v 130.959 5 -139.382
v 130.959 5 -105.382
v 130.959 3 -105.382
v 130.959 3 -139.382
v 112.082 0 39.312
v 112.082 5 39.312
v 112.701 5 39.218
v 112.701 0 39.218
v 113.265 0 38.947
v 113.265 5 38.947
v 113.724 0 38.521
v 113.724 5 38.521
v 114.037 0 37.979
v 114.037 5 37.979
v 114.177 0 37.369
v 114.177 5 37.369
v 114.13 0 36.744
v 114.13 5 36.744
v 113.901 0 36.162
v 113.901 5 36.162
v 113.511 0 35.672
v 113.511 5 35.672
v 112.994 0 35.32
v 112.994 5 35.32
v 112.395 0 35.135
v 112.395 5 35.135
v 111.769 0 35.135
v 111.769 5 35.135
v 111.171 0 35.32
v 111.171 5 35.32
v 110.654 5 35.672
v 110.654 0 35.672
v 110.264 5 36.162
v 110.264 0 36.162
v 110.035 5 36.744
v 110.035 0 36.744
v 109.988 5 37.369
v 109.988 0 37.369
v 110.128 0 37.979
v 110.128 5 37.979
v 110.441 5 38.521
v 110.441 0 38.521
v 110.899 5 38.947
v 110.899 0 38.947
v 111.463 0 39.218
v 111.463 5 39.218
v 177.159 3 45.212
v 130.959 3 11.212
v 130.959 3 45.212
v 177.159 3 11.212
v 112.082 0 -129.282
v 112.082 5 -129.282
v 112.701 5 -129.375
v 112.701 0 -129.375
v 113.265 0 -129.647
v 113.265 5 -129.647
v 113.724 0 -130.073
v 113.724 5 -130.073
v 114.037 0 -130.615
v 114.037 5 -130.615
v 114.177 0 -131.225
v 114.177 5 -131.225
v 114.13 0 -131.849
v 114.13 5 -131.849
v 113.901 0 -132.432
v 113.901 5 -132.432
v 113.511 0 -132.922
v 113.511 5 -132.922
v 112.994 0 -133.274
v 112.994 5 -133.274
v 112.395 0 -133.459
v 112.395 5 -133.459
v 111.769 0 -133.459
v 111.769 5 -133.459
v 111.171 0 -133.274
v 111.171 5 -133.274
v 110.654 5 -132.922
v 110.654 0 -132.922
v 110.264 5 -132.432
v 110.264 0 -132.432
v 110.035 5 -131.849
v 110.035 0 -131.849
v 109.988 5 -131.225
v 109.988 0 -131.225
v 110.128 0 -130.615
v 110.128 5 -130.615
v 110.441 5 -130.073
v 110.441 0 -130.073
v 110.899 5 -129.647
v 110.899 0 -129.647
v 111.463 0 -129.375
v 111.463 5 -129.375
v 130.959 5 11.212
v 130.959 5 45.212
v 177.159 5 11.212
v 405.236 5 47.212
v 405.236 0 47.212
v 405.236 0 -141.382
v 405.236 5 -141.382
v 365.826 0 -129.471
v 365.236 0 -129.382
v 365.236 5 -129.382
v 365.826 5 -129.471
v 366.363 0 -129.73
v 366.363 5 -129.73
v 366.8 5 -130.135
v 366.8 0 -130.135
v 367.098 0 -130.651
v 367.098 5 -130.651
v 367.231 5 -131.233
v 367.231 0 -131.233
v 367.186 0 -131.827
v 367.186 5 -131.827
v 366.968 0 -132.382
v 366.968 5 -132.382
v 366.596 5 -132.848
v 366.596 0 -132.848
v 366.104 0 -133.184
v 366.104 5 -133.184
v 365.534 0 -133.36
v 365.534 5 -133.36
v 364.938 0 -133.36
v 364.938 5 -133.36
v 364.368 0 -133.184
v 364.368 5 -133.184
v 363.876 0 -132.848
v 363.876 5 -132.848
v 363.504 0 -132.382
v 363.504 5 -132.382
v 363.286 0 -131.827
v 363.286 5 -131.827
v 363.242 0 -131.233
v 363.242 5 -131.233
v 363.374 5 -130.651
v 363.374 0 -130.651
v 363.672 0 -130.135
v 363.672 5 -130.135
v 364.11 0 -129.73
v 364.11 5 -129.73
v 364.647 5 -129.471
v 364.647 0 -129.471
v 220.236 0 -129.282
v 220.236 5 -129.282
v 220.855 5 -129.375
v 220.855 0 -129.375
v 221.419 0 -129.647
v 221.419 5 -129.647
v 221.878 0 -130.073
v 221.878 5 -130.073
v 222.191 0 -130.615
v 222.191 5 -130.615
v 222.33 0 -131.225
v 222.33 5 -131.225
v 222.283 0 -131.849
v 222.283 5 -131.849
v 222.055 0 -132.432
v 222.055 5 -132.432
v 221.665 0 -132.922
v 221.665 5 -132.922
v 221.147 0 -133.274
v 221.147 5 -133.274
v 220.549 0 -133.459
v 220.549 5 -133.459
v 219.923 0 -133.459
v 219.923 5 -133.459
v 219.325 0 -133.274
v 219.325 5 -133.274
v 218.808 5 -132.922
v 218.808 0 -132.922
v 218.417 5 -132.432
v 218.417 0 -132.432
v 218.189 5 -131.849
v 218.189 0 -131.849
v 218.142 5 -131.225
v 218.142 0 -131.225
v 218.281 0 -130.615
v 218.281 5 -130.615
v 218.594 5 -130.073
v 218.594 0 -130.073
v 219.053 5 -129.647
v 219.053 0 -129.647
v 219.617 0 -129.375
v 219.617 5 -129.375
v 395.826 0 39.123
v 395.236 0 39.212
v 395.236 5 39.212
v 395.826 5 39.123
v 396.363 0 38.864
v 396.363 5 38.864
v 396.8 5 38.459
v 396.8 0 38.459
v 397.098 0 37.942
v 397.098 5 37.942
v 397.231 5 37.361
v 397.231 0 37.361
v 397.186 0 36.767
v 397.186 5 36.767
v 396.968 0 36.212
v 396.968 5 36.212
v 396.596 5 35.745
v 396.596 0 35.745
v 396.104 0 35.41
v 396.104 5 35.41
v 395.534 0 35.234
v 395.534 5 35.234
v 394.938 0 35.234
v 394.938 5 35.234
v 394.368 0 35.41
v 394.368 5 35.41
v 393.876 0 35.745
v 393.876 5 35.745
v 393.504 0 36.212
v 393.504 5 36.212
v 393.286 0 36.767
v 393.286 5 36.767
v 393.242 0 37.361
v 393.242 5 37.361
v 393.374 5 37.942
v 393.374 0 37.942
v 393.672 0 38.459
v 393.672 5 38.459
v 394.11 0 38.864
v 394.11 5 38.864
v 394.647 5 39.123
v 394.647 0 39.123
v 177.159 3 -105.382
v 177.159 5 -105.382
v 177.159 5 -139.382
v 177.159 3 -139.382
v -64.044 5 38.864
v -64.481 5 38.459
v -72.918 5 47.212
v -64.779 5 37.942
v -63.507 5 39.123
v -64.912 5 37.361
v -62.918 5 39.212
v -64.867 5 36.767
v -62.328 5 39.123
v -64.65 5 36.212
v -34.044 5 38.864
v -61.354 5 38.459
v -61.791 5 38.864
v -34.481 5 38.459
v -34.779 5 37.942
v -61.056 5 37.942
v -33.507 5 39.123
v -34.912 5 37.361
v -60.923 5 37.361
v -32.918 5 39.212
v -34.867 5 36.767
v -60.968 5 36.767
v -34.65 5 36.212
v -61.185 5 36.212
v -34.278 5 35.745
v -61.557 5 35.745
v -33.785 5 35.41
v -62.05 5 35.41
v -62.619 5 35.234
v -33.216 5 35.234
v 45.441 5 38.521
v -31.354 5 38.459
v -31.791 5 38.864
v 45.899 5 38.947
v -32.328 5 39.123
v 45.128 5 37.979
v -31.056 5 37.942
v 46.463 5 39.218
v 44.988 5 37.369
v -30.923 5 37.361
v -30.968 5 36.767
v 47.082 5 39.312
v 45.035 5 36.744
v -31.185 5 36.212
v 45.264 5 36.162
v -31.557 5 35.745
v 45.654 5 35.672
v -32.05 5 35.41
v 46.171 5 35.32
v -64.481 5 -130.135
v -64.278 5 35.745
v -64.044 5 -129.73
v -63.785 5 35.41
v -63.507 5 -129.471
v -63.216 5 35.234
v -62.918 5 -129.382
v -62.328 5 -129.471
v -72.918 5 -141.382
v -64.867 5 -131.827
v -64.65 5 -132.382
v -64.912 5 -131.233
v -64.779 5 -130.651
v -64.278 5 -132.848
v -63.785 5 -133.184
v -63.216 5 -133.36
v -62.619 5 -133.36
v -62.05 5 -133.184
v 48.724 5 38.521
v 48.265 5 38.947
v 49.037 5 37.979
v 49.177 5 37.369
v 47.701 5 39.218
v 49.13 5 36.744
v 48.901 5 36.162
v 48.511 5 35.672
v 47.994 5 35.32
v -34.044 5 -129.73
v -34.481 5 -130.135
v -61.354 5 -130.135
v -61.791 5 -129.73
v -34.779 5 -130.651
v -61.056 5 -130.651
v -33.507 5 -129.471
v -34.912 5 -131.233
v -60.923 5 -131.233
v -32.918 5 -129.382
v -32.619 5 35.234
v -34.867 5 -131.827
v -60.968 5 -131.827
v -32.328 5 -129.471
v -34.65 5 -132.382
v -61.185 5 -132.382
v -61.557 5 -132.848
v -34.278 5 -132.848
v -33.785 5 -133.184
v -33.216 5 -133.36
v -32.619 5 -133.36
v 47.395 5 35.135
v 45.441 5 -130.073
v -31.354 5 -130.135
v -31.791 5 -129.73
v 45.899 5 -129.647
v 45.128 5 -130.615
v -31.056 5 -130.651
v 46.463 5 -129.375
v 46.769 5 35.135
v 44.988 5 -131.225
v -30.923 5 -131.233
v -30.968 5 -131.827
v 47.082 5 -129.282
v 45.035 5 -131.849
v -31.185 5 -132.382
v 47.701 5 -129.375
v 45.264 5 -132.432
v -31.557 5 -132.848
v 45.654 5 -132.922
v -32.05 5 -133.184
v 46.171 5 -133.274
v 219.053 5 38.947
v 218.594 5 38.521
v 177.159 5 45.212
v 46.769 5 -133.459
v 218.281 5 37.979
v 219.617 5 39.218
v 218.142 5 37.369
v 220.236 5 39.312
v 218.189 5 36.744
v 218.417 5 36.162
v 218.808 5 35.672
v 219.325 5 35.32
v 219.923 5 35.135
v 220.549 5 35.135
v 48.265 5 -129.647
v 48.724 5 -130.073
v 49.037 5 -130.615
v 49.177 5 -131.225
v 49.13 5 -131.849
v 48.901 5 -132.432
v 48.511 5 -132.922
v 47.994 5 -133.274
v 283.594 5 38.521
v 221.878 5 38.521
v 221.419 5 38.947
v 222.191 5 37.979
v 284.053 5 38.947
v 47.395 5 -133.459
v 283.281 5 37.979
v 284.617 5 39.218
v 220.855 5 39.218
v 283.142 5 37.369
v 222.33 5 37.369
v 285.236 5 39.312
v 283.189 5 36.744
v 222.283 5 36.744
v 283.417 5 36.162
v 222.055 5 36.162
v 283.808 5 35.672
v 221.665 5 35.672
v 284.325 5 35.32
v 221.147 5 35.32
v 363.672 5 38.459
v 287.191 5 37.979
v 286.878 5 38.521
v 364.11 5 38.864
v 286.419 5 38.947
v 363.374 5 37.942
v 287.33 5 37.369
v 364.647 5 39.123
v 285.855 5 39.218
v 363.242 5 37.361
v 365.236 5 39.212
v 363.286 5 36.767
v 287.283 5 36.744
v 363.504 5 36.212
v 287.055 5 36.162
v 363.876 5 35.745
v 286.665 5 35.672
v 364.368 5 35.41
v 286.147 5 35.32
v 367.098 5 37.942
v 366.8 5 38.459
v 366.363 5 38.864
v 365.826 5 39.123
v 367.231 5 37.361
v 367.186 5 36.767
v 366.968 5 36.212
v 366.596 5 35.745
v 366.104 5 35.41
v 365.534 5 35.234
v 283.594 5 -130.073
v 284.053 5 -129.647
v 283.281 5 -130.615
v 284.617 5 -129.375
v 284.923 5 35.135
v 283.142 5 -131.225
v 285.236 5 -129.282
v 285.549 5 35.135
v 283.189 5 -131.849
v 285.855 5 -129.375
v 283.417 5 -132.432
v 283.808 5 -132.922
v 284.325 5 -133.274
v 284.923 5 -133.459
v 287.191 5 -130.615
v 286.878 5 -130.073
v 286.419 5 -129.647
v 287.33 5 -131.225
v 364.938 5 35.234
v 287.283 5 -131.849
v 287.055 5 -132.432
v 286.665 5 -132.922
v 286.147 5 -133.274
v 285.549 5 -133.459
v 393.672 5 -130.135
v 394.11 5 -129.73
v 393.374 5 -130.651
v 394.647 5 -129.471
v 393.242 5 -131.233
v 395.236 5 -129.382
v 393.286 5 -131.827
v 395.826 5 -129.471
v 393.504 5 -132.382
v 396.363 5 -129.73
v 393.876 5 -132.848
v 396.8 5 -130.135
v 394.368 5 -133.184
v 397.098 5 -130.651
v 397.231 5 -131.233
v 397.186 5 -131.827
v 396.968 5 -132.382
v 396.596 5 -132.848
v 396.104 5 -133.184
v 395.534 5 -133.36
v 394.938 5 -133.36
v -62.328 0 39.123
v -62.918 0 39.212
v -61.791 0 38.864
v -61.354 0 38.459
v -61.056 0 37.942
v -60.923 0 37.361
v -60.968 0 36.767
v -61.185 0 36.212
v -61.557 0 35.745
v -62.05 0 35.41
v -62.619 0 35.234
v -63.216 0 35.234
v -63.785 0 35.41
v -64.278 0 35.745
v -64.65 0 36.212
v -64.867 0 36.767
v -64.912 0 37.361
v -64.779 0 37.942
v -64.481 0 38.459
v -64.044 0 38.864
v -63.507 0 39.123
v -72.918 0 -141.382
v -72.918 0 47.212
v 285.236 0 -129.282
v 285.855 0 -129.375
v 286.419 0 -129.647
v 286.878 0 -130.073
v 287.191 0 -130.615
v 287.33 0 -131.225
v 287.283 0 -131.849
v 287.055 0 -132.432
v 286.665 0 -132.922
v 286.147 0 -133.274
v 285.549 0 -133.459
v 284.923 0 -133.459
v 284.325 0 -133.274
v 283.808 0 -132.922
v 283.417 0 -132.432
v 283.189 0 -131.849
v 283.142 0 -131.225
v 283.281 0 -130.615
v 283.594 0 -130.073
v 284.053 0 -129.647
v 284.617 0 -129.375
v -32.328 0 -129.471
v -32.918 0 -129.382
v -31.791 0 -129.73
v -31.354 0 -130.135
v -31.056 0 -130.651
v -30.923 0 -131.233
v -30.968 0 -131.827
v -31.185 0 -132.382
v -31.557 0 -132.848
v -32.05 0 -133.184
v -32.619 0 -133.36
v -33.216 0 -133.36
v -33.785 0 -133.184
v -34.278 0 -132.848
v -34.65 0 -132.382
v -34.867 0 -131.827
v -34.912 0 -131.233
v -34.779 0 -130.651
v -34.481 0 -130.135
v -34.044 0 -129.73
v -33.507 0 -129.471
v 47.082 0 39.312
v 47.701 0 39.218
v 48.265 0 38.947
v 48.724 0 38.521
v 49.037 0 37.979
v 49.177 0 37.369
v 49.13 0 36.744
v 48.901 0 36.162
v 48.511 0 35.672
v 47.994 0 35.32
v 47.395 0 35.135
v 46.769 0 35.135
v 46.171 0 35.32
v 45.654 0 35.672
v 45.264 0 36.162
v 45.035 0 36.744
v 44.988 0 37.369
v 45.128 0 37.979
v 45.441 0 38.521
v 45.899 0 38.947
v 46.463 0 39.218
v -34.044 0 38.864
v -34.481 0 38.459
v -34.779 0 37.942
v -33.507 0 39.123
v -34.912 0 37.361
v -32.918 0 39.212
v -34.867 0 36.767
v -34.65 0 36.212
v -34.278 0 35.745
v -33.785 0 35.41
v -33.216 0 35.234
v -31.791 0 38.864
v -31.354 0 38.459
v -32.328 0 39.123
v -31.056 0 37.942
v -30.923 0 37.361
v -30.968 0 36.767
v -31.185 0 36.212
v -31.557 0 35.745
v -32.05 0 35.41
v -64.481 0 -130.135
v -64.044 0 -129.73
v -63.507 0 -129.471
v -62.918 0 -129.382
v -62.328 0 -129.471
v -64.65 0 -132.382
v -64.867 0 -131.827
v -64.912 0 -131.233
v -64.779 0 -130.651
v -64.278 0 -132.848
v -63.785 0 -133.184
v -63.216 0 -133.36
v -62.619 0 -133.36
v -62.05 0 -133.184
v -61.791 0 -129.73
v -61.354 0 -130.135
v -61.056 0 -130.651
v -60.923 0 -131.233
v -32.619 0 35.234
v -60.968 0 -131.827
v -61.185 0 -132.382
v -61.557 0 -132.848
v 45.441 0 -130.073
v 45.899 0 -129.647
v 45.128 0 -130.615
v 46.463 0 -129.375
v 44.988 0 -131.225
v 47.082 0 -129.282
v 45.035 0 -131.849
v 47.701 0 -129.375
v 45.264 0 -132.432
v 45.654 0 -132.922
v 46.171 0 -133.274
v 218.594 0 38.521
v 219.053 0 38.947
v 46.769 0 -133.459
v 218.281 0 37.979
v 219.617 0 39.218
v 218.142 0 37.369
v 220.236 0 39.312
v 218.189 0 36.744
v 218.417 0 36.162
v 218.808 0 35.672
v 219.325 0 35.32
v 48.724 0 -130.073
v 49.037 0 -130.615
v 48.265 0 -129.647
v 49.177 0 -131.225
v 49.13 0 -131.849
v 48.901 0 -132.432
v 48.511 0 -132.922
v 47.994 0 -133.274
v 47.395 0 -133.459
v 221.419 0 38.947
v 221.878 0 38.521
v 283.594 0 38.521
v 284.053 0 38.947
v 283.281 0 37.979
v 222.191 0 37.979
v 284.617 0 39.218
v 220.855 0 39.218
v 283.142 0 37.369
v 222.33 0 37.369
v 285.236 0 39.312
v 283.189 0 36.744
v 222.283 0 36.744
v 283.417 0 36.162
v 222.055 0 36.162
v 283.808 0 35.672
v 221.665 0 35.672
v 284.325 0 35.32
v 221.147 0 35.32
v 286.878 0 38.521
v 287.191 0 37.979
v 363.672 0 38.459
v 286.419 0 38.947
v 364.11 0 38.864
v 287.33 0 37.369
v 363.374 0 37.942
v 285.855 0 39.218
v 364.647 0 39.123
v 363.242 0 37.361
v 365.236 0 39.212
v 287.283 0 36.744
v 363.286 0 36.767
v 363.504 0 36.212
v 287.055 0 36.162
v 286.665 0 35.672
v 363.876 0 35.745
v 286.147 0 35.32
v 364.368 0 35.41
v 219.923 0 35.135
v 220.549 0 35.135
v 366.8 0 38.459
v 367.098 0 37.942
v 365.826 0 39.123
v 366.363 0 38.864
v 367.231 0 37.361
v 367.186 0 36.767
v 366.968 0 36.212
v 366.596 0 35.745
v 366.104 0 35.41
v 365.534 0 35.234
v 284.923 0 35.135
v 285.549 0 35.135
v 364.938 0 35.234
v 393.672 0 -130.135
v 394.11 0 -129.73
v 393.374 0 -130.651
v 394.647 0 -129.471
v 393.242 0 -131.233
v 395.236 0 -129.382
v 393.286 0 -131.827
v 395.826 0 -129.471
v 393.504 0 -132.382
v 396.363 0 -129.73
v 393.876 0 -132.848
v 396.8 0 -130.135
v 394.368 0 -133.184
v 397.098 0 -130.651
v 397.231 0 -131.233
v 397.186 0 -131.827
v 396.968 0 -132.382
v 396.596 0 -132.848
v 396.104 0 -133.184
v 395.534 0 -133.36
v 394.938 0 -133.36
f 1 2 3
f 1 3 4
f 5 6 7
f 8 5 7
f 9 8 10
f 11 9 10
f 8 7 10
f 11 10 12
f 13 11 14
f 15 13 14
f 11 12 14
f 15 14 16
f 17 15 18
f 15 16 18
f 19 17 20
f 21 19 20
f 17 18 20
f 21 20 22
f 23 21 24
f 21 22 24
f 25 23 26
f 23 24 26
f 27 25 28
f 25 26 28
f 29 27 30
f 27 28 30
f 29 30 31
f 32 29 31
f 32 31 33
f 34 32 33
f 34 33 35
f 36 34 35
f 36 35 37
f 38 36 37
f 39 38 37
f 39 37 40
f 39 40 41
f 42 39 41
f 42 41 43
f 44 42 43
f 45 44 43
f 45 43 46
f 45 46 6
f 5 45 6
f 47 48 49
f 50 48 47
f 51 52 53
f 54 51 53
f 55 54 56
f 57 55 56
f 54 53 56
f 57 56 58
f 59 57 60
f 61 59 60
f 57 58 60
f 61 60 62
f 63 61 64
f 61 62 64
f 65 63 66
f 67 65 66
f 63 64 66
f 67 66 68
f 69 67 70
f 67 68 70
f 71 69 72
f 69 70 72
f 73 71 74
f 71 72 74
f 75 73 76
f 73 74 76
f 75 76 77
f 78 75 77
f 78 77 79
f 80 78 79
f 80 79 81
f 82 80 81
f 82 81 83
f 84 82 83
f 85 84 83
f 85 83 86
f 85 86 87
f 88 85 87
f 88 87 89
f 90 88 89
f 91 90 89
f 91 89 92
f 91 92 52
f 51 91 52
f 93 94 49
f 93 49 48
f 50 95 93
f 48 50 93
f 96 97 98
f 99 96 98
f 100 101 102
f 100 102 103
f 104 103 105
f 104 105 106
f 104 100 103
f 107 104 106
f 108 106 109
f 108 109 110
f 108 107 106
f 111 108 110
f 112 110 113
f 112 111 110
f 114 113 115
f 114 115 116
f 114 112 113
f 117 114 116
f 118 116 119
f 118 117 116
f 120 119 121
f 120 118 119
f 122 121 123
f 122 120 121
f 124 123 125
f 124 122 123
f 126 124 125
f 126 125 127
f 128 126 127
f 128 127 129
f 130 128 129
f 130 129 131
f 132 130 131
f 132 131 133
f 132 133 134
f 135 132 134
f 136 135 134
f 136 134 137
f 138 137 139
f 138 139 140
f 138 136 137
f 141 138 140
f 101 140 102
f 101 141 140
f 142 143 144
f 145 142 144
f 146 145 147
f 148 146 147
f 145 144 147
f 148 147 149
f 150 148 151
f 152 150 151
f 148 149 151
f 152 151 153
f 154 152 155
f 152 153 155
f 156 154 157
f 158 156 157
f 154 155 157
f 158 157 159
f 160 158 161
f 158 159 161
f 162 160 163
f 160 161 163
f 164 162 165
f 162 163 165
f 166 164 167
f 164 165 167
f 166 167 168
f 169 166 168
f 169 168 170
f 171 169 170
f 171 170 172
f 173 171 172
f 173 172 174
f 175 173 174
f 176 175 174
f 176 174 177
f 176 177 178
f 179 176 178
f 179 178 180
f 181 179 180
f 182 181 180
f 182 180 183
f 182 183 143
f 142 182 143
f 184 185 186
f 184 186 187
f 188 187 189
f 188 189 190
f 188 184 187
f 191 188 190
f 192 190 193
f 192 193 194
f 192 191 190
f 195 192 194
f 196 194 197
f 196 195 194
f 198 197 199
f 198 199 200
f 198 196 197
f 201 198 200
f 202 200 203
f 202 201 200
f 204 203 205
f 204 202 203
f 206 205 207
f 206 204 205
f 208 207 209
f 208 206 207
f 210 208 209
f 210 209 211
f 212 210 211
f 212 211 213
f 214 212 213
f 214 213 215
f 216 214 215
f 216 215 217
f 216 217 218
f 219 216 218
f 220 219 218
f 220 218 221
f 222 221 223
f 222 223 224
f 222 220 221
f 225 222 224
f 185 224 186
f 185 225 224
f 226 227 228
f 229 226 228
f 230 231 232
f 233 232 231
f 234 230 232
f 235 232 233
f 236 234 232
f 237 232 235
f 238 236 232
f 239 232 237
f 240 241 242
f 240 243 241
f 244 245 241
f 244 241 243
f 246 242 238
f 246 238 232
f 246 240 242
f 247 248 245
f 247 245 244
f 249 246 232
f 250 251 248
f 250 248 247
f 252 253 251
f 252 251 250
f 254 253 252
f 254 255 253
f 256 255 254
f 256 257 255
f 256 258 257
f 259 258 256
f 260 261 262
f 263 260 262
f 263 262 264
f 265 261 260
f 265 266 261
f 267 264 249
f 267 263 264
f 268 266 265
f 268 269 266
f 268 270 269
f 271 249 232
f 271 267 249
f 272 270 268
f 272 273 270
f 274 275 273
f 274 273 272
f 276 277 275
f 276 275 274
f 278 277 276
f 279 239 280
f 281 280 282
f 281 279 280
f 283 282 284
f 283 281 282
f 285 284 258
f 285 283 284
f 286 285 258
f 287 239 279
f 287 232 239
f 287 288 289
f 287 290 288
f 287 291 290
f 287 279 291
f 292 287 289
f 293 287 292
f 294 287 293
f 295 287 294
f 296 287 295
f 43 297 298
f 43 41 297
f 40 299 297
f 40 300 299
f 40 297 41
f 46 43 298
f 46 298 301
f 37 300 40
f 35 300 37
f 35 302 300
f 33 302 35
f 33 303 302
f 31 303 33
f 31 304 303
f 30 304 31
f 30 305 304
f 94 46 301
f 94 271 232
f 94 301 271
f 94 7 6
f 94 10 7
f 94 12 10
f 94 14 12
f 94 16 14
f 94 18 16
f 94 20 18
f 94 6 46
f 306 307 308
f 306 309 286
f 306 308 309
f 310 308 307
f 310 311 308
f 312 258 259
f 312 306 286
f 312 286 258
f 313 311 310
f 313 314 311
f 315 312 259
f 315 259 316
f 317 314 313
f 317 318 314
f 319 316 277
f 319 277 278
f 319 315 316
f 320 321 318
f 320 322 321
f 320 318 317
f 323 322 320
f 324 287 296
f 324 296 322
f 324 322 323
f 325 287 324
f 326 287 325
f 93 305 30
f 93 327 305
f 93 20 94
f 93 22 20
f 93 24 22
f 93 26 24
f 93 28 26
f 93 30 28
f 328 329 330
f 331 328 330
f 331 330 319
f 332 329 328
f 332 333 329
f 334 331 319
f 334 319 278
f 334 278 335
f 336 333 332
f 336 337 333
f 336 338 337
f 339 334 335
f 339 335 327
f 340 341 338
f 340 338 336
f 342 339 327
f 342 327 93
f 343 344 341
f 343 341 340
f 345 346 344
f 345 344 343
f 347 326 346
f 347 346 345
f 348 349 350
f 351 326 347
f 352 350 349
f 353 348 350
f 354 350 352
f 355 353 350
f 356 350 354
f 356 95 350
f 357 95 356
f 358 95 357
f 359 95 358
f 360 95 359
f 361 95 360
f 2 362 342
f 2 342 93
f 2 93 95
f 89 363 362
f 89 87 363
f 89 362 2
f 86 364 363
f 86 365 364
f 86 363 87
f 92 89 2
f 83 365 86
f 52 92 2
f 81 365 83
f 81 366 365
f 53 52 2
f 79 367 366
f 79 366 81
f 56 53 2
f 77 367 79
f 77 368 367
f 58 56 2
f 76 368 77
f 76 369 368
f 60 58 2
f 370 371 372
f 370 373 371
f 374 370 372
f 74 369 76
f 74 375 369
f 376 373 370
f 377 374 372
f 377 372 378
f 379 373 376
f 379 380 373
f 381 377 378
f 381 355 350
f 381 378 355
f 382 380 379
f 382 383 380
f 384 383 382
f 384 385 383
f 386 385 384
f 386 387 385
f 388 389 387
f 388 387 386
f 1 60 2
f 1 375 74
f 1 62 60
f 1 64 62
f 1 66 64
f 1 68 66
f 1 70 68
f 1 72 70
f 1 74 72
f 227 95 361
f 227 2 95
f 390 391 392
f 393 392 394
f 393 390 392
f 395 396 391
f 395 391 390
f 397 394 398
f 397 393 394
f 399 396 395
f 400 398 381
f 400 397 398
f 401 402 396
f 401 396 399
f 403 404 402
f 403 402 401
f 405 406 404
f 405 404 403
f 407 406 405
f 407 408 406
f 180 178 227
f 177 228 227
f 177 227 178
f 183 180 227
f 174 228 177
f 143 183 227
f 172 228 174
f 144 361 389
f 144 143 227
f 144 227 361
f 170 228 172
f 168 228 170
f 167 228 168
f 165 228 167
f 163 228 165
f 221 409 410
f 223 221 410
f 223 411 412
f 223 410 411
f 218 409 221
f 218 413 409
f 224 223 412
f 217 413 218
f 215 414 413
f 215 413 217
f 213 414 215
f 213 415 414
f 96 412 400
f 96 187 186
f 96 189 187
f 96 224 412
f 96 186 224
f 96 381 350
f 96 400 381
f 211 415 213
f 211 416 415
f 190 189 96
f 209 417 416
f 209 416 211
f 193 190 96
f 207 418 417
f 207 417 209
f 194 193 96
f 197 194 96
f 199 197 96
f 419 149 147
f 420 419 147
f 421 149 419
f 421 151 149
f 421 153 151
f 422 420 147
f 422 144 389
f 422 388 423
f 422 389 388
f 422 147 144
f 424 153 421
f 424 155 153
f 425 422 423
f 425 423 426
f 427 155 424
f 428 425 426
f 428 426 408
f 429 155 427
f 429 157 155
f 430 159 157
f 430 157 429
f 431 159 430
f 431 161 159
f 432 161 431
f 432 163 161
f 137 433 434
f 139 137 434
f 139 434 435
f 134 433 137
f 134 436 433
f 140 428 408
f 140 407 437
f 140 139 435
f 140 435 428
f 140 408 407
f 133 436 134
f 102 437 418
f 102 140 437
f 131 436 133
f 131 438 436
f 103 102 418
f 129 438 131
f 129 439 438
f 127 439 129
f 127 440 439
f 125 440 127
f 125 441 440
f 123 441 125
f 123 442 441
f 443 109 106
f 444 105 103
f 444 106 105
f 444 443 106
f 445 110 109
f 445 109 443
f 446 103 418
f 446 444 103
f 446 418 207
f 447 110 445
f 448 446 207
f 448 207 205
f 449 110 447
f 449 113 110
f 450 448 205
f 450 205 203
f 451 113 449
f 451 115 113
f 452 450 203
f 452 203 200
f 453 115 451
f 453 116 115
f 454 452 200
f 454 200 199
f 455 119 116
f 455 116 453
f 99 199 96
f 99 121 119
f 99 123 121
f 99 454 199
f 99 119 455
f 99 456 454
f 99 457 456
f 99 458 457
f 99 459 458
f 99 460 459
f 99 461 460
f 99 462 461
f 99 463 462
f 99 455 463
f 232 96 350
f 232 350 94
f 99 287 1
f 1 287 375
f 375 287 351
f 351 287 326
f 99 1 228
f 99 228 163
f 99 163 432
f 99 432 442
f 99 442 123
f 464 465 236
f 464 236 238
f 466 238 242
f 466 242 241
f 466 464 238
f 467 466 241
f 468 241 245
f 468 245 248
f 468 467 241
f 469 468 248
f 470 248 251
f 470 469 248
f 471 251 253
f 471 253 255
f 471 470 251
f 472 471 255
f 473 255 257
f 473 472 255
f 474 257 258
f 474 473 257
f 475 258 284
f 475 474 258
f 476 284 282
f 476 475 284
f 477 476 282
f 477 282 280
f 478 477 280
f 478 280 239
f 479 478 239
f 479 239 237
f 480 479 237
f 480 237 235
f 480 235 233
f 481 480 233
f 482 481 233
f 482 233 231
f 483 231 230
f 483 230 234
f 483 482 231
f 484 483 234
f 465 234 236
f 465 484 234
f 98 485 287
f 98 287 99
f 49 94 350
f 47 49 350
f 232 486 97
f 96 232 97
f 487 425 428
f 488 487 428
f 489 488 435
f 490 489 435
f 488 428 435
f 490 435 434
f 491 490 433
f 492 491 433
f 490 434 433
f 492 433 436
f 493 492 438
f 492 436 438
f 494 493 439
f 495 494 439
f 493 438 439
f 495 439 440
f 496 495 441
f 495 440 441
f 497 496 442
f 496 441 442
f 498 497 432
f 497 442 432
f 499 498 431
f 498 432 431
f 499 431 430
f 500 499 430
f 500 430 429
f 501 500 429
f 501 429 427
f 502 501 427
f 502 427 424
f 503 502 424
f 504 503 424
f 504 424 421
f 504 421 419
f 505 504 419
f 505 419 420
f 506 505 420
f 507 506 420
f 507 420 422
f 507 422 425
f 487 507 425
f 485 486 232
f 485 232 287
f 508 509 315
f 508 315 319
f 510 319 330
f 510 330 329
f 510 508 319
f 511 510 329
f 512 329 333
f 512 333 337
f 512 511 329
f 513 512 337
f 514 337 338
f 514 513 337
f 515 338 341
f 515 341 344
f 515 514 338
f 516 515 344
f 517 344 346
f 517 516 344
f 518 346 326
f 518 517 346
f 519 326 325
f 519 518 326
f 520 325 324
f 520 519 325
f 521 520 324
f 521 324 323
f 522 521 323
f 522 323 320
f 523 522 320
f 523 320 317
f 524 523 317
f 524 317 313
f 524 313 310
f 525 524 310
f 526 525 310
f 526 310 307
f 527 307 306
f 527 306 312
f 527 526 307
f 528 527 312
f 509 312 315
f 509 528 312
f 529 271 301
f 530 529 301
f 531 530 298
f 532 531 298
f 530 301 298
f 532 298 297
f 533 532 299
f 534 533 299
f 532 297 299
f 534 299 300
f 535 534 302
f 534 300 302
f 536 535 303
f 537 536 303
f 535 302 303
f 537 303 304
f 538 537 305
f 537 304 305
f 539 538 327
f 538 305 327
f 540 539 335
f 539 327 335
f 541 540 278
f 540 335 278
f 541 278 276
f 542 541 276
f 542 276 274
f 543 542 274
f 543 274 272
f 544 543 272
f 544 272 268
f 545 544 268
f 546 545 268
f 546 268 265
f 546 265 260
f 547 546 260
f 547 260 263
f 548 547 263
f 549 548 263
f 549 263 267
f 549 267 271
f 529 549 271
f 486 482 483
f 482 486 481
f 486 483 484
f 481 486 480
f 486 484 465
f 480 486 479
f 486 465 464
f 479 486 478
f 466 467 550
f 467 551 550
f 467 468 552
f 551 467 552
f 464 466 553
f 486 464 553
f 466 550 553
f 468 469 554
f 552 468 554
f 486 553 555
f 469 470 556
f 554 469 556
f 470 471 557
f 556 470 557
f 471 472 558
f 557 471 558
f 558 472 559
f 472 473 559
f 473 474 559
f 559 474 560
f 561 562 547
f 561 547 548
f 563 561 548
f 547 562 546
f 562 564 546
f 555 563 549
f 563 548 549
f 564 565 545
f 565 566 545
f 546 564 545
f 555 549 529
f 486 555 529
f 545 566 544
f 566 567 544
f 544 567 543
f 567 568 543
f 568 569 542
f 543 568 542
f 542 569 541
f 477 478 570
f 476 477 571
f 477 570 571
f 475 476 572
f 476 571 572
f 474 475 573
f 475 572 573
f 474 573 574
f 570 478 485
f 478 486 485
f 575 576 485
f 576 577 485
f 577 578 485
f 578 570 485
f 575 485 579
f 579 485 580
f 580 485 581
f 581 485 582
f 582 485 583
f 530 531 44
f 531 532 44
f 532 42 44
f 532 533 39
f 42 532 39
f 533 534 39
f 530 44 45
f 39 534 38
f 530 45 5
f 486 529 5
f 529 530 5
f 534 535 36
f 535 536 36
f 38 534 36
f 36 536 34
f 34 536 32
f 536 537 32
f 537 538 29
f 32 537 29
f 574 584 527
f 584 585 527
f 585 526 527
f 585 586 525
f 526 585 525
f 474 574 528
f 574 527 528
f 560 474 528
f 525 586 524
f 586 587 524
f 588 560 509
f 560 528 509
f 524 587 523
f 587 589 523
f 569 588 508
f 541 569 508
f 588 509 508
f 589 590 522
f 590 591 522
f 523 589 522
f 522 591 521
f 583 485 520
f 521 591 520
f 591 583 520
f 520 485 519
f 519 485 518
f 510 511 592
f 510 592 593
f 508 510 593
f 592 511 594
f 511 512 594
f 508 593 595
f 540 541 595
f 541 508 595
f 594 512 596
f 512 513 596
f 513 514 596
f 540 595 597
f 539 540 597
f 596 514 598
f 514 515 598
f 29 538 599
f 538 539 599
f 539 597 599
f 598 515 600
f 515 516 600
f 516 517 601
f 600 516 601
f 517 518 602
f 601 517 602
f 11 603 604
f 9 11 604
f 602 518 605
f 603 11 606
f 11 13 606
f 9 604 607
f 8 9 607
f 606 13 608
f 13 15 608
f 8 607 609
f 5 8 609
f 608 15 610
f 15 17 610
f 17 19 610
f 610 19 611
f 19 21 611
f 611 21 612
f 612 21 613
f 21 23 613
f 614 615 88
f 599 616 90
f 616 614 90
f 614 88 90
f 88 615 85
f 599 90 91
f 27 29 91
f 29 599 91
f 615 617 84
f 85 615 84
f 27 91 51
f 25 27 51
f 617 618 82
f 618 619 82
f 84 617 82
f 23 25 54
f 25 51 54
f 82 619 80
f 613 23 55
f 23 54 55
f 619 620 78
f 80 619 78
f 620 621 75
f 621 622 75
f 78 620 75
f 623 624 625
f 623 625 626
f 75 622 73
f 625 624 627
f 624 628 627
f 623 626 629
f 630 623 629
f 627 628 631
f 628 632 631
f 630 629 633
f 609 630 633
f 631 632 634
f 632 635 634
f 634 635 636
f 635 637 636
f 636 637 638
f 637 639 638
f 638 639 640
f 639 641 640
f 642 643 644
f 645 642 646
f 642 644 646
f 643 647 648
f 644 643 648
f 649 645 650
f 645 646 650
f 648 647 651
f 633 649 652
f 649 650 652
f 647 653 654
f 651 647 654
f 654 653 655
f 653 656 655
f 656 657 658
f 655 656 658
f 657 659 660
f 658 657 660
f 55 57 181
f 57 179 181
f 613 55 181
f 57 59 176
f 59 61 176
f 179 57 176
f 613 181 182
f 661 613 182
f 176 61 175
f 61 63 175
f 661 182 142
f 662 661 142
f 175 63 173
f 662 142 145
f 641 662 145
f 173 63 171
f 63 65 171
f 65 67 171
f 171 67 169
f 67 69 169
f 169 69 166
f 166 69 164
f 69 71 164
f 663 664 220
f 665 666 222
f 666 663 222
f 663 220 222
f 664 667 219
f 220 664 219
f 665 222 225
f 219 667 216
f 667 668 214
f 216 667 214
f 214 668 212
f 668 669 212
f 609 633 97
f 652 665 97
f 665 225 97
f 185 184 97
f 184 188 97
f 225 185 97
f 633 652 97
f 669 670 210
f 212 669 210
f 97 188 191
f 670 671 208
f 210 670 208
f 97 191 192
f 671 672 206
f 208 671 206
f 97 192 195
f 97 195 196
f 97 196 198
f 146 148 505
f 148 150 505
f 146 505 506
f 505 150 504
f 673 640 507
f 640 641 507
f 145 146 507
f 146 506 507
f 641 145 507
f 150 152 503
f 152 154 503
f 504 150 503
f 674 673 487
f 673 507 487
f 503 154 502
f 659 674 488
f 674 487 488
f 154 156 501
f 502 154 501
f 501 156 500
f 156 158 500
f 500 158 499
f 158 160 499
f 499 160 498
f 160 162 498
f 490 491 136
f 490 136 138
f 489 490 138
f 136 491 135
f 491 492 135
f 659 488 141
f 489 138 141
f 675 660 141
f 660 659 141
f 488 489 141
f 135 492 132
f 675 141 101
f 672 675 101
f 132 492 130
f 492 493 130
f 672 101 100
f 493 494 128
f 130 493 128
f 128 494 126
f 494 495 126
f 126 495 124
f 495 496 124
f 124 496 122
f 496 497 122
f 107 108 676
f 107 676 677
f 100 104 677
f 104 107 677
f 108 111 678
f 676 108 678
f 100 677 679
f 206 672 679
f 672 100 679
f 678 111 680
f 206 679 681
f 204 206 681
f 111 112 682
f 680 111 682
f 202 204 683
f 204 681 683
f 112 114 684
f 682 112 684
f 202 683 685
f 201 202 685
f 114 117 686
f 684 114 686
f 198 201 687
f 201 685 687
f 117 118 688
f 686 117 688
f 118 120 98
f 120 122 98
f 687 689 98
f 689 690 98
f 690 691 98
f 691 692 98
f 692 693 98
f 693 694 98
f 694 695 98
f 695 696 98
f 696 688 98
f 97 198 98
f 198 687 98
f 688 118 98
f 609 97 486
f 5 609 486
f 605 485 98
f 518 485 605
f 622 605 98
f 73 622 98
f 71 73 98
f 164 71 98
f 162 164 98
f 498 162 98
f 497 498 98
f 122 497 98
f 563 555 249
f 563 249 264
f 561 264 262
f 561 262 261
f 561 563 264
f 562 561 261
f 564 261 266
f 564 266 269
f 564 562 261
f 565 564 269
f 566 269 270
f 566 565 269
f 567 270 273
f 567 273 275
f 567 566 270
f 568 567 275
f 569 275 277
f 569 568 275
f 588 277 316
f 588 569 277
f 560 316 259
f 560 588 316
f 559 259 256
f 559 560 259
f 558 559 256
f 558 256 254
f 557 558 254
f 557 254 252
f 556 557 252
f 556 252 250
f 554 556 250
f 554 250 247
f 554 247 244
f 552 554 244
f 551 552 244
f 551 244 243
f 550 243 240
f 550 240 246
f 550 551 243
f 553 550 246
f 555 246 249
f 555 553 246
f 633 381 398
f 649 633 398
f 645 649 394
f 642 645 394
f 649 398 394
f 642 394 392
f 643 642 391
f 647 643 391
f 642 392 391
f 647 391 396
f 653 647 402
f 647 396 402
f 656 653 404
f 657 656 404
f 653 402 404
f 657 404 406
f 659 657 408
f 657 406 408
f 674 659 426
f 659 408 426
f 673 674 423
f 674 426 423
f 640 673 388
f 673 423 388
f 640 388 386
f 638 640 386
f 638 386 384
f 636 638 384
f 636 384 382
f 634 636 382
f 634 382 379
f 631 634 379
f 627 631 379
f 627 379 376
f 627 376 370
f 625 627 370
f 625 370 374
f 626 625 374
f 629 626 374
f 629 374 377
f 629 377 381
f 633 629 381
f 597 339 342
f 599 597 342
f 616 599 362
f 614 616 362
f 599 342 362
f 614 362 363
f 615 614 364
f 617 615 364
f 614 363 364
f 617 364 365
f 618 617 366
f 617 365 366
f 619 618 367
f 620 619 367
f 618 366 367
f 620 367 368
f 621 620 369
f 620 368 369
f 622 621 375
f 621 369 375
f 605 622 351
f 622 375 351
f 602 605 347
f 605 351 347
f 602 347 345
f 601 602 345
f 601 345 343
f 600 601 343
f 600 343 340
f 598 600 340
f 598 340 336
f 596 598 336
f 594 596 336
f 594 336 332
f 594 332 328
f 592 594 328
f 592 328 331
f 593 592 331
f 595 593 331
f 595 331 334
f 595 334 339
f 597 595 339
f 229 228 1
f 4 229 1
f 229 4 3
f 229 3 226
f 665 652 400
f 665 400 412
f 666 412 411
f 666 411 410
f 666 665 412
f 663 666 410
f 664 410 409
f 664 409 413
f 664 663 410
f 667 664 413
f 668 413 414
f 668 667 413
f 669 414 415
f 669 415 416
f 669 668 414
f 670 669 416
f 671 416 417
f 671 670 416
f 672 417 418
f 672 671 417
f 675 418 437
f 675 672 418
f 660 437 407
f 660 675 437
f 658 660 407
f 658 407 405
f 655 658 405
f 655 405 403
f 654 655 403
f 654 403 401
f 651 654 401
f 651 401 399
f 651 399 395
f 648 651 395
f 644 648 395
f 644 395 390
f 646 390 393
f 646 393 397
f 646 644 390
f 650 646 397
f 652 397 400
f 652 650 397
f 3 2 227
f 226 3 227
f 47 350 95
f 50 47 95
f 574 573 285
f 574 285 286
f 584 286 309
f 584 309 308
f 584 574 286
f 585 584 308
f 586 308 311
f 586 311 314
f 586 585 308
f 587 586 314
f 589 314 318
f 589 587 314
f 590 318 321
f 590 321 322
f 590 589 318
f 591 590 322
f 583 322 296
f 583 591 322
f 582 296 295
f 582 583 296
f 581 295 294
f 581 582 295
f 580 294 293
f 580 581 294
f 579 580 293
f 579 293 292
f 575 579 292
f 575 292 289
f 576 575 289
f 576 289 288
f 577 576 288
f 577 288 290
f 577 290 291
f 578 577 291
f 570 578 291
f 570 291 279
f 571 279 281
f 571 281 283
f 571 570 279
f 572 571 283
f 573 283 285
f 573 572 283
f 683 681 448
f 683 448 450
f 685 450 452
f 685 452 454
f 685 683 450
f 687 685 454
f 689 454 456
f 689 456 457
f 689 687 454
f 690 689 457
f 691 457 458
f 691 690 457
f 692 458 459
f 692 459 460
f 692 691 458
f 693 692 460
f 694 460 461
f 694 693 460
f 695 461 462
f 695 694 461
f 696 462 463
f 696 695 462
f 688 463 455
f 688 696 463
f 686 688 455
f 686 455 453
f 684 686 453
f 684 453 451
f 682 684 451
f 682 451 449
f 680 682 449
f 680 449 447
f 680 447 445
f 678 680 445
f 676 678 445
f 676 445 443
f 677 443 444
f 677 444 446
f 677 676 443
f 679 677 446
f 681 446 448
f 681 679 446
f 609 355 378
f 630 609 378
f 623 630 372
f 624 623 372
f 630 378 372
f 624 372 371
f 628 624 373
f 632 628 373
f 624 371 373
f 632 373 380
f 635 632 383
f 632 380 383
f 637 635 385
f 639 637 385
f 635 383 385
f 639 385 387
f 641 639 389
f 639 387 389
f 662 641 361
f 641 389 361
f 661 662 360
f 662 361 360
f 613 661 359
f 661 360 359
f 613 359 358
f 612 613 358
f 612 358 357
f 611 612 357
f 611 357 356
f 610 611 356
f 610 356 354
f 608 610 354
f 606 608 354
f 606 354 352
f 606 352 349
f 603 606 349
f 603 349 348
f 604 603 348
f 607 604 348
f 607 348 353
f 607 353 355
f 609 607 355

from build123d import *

# Parameters (mm, degrees)
ESQUISSE1_W             = 478.153686012
ESQUISSE1_H             = 188.593708553
ESQUISSE1_R             = 2
BOSS_EXTRU_4_DEPTH      = 5
ESQUISSE2_W             = 35.2
ESQUISSE2_H             = 34
ESQUISSE2_W_2           = 11
ENL_V_MAT_EXTRU_1_DEPTH = 2
ESQUISSE3_R             = 2.1
ENL_V_MAT_EXTRU_2_DEPTH = 10


with BuildPart() as part:
    # Esquisse1 → Boss.-Extru.4 (new body)
    with BuildSketch(Plane(origin=(0, 0, 0), x_dir=(1, 0, 0), z_dir=(0, 1, 0))):
        with Locations((166.159297522, 47.085285911)):
            Rectangle(ESQUISSE1_W, ESQUISSE1_H)
        with Locations(Location((-62.917545484, 131.382140187, 0), (0, 0, 270))):
            Circle(ESQUISSE1_R, mode=Mode.SUBTRACT)
        with Locations(Location((-62.917545484, -37.211568366, 0), (0, 0, 270))):
            Circle(ESQUISSE1_R, mode=Mode.SUBTRACT)
        with Locations(Location((395.236140528, -37.211568366, 0), (0, 0, 270))):
            Circle(ESQUISSE1_R, mode=Mode.SUBTRACT)
        with Locations(Location((395.236140528, 131.382140187, 0), (0, 0, 270))):
            Circle(ESQUISSE1_R, mode=Mode.SUBTRACT)
        with Locations(Location((-32.917545484, -37.211568366, 0), (0, 0, 270))):
            Circle(ESQUISSE1_R, mode=Mode.SUBTRACT)
        with Locations(Location((-32.917545484, 131.382140187, 0), (0, 0, 270))):
            Circle(ESQUISSE1_R, mode=Mode.SUBTRACT)
        with Locations(Location((365.236140528, 131.382140187, 0), (0, 0, 270))):
            Circle(ESQUISSE1_R, mode=Mode.SUBTRACT)
        with Locations(Location((365.236140528, -37.211568366, 0), (0, 0, 270))):
            Circle(ESQUISSE1_R, mode=Mode.SUBTRACT)
    extrude(amount=BOSS_EXTRU_4_DEPTH)

    # Esquisse2 → Enlèv. mat.-Extru.1 (cut)
    with BuildSketch(Plane(origin=(0, 5, 0), x_dir=(1, 0, 0), z_dir=(0, 1, 0))):
        with Locations((148.559297522, 122.382140187)):
            Rectangle(ESQUISSE2_W, ESQUISSE2_H)
        with Locations((171.659297522, 122.382140187)):
            Rectangle(ESQUISSE2_W_2, ESQUISSE2_H)
        with Locations((148.559297522, -28.211568366)):
            Rectangle(ESQUISSE2_W, ESQUISSE2_H)
        with Locations((171.659297522, -28.211568366)):
            Rectangle(ESQUISSE2_W_2, ESQUISSE2_H)
    extrude(amount=-ENL_V_MAT_EXTRU_1_DEPTH, mode=Mode.SUBTRACT)

    # Esquisse3 → Enlèv. mat.-Extru.2 (cut)
    with BuildSketch(Plane(origin=(0, 5, 0), x_dir=(1, 0, 0), z_dir=(0, 1, 0))):
        with Locations(Location((47.082454516, 131.382140187, 0), (0, 0, 270))):
            Circle(ESQUISSE3_R)
        with Locations(Location((47.082454516, -37.211568366, 0), (0, 0, 270))):
            Circle(ESQUISSE3_R)
        with Locations(Location((285.236140528, 131.382140187, 0), (0, 0, 270))):
            Circle(ESQUISSE3_R)
        with Locations(Location((285.236140528, -37.211568366, 0), (0, 0, 270))):
            Circle(ESQUISSE3_R)
        with Locations(Location((220.236140528, 131.382140187, 0), (0, 0, 270))):
            Circle(ESQUISSE3_R)
        with Locations(Location((220.236140528, -37.211568366, 0), (0, 0, 270))):
            Circle(ESQUISSE3_R)
        with Locations(Location((112.082454516, 131.382140187, 0), (0, 0, 270))):
            Circle(ESQUISSE3_R)
        with Locations(Location((112.082454516, -37.211568366, 0), (0, 0, 270))):
            Circle(ESQUISSE3_R)
    extrude(amount=-ENL_V_MAT_EXTRU_2_DEPTH, mode=Mode.SUBTRACT)


solid = part.part
